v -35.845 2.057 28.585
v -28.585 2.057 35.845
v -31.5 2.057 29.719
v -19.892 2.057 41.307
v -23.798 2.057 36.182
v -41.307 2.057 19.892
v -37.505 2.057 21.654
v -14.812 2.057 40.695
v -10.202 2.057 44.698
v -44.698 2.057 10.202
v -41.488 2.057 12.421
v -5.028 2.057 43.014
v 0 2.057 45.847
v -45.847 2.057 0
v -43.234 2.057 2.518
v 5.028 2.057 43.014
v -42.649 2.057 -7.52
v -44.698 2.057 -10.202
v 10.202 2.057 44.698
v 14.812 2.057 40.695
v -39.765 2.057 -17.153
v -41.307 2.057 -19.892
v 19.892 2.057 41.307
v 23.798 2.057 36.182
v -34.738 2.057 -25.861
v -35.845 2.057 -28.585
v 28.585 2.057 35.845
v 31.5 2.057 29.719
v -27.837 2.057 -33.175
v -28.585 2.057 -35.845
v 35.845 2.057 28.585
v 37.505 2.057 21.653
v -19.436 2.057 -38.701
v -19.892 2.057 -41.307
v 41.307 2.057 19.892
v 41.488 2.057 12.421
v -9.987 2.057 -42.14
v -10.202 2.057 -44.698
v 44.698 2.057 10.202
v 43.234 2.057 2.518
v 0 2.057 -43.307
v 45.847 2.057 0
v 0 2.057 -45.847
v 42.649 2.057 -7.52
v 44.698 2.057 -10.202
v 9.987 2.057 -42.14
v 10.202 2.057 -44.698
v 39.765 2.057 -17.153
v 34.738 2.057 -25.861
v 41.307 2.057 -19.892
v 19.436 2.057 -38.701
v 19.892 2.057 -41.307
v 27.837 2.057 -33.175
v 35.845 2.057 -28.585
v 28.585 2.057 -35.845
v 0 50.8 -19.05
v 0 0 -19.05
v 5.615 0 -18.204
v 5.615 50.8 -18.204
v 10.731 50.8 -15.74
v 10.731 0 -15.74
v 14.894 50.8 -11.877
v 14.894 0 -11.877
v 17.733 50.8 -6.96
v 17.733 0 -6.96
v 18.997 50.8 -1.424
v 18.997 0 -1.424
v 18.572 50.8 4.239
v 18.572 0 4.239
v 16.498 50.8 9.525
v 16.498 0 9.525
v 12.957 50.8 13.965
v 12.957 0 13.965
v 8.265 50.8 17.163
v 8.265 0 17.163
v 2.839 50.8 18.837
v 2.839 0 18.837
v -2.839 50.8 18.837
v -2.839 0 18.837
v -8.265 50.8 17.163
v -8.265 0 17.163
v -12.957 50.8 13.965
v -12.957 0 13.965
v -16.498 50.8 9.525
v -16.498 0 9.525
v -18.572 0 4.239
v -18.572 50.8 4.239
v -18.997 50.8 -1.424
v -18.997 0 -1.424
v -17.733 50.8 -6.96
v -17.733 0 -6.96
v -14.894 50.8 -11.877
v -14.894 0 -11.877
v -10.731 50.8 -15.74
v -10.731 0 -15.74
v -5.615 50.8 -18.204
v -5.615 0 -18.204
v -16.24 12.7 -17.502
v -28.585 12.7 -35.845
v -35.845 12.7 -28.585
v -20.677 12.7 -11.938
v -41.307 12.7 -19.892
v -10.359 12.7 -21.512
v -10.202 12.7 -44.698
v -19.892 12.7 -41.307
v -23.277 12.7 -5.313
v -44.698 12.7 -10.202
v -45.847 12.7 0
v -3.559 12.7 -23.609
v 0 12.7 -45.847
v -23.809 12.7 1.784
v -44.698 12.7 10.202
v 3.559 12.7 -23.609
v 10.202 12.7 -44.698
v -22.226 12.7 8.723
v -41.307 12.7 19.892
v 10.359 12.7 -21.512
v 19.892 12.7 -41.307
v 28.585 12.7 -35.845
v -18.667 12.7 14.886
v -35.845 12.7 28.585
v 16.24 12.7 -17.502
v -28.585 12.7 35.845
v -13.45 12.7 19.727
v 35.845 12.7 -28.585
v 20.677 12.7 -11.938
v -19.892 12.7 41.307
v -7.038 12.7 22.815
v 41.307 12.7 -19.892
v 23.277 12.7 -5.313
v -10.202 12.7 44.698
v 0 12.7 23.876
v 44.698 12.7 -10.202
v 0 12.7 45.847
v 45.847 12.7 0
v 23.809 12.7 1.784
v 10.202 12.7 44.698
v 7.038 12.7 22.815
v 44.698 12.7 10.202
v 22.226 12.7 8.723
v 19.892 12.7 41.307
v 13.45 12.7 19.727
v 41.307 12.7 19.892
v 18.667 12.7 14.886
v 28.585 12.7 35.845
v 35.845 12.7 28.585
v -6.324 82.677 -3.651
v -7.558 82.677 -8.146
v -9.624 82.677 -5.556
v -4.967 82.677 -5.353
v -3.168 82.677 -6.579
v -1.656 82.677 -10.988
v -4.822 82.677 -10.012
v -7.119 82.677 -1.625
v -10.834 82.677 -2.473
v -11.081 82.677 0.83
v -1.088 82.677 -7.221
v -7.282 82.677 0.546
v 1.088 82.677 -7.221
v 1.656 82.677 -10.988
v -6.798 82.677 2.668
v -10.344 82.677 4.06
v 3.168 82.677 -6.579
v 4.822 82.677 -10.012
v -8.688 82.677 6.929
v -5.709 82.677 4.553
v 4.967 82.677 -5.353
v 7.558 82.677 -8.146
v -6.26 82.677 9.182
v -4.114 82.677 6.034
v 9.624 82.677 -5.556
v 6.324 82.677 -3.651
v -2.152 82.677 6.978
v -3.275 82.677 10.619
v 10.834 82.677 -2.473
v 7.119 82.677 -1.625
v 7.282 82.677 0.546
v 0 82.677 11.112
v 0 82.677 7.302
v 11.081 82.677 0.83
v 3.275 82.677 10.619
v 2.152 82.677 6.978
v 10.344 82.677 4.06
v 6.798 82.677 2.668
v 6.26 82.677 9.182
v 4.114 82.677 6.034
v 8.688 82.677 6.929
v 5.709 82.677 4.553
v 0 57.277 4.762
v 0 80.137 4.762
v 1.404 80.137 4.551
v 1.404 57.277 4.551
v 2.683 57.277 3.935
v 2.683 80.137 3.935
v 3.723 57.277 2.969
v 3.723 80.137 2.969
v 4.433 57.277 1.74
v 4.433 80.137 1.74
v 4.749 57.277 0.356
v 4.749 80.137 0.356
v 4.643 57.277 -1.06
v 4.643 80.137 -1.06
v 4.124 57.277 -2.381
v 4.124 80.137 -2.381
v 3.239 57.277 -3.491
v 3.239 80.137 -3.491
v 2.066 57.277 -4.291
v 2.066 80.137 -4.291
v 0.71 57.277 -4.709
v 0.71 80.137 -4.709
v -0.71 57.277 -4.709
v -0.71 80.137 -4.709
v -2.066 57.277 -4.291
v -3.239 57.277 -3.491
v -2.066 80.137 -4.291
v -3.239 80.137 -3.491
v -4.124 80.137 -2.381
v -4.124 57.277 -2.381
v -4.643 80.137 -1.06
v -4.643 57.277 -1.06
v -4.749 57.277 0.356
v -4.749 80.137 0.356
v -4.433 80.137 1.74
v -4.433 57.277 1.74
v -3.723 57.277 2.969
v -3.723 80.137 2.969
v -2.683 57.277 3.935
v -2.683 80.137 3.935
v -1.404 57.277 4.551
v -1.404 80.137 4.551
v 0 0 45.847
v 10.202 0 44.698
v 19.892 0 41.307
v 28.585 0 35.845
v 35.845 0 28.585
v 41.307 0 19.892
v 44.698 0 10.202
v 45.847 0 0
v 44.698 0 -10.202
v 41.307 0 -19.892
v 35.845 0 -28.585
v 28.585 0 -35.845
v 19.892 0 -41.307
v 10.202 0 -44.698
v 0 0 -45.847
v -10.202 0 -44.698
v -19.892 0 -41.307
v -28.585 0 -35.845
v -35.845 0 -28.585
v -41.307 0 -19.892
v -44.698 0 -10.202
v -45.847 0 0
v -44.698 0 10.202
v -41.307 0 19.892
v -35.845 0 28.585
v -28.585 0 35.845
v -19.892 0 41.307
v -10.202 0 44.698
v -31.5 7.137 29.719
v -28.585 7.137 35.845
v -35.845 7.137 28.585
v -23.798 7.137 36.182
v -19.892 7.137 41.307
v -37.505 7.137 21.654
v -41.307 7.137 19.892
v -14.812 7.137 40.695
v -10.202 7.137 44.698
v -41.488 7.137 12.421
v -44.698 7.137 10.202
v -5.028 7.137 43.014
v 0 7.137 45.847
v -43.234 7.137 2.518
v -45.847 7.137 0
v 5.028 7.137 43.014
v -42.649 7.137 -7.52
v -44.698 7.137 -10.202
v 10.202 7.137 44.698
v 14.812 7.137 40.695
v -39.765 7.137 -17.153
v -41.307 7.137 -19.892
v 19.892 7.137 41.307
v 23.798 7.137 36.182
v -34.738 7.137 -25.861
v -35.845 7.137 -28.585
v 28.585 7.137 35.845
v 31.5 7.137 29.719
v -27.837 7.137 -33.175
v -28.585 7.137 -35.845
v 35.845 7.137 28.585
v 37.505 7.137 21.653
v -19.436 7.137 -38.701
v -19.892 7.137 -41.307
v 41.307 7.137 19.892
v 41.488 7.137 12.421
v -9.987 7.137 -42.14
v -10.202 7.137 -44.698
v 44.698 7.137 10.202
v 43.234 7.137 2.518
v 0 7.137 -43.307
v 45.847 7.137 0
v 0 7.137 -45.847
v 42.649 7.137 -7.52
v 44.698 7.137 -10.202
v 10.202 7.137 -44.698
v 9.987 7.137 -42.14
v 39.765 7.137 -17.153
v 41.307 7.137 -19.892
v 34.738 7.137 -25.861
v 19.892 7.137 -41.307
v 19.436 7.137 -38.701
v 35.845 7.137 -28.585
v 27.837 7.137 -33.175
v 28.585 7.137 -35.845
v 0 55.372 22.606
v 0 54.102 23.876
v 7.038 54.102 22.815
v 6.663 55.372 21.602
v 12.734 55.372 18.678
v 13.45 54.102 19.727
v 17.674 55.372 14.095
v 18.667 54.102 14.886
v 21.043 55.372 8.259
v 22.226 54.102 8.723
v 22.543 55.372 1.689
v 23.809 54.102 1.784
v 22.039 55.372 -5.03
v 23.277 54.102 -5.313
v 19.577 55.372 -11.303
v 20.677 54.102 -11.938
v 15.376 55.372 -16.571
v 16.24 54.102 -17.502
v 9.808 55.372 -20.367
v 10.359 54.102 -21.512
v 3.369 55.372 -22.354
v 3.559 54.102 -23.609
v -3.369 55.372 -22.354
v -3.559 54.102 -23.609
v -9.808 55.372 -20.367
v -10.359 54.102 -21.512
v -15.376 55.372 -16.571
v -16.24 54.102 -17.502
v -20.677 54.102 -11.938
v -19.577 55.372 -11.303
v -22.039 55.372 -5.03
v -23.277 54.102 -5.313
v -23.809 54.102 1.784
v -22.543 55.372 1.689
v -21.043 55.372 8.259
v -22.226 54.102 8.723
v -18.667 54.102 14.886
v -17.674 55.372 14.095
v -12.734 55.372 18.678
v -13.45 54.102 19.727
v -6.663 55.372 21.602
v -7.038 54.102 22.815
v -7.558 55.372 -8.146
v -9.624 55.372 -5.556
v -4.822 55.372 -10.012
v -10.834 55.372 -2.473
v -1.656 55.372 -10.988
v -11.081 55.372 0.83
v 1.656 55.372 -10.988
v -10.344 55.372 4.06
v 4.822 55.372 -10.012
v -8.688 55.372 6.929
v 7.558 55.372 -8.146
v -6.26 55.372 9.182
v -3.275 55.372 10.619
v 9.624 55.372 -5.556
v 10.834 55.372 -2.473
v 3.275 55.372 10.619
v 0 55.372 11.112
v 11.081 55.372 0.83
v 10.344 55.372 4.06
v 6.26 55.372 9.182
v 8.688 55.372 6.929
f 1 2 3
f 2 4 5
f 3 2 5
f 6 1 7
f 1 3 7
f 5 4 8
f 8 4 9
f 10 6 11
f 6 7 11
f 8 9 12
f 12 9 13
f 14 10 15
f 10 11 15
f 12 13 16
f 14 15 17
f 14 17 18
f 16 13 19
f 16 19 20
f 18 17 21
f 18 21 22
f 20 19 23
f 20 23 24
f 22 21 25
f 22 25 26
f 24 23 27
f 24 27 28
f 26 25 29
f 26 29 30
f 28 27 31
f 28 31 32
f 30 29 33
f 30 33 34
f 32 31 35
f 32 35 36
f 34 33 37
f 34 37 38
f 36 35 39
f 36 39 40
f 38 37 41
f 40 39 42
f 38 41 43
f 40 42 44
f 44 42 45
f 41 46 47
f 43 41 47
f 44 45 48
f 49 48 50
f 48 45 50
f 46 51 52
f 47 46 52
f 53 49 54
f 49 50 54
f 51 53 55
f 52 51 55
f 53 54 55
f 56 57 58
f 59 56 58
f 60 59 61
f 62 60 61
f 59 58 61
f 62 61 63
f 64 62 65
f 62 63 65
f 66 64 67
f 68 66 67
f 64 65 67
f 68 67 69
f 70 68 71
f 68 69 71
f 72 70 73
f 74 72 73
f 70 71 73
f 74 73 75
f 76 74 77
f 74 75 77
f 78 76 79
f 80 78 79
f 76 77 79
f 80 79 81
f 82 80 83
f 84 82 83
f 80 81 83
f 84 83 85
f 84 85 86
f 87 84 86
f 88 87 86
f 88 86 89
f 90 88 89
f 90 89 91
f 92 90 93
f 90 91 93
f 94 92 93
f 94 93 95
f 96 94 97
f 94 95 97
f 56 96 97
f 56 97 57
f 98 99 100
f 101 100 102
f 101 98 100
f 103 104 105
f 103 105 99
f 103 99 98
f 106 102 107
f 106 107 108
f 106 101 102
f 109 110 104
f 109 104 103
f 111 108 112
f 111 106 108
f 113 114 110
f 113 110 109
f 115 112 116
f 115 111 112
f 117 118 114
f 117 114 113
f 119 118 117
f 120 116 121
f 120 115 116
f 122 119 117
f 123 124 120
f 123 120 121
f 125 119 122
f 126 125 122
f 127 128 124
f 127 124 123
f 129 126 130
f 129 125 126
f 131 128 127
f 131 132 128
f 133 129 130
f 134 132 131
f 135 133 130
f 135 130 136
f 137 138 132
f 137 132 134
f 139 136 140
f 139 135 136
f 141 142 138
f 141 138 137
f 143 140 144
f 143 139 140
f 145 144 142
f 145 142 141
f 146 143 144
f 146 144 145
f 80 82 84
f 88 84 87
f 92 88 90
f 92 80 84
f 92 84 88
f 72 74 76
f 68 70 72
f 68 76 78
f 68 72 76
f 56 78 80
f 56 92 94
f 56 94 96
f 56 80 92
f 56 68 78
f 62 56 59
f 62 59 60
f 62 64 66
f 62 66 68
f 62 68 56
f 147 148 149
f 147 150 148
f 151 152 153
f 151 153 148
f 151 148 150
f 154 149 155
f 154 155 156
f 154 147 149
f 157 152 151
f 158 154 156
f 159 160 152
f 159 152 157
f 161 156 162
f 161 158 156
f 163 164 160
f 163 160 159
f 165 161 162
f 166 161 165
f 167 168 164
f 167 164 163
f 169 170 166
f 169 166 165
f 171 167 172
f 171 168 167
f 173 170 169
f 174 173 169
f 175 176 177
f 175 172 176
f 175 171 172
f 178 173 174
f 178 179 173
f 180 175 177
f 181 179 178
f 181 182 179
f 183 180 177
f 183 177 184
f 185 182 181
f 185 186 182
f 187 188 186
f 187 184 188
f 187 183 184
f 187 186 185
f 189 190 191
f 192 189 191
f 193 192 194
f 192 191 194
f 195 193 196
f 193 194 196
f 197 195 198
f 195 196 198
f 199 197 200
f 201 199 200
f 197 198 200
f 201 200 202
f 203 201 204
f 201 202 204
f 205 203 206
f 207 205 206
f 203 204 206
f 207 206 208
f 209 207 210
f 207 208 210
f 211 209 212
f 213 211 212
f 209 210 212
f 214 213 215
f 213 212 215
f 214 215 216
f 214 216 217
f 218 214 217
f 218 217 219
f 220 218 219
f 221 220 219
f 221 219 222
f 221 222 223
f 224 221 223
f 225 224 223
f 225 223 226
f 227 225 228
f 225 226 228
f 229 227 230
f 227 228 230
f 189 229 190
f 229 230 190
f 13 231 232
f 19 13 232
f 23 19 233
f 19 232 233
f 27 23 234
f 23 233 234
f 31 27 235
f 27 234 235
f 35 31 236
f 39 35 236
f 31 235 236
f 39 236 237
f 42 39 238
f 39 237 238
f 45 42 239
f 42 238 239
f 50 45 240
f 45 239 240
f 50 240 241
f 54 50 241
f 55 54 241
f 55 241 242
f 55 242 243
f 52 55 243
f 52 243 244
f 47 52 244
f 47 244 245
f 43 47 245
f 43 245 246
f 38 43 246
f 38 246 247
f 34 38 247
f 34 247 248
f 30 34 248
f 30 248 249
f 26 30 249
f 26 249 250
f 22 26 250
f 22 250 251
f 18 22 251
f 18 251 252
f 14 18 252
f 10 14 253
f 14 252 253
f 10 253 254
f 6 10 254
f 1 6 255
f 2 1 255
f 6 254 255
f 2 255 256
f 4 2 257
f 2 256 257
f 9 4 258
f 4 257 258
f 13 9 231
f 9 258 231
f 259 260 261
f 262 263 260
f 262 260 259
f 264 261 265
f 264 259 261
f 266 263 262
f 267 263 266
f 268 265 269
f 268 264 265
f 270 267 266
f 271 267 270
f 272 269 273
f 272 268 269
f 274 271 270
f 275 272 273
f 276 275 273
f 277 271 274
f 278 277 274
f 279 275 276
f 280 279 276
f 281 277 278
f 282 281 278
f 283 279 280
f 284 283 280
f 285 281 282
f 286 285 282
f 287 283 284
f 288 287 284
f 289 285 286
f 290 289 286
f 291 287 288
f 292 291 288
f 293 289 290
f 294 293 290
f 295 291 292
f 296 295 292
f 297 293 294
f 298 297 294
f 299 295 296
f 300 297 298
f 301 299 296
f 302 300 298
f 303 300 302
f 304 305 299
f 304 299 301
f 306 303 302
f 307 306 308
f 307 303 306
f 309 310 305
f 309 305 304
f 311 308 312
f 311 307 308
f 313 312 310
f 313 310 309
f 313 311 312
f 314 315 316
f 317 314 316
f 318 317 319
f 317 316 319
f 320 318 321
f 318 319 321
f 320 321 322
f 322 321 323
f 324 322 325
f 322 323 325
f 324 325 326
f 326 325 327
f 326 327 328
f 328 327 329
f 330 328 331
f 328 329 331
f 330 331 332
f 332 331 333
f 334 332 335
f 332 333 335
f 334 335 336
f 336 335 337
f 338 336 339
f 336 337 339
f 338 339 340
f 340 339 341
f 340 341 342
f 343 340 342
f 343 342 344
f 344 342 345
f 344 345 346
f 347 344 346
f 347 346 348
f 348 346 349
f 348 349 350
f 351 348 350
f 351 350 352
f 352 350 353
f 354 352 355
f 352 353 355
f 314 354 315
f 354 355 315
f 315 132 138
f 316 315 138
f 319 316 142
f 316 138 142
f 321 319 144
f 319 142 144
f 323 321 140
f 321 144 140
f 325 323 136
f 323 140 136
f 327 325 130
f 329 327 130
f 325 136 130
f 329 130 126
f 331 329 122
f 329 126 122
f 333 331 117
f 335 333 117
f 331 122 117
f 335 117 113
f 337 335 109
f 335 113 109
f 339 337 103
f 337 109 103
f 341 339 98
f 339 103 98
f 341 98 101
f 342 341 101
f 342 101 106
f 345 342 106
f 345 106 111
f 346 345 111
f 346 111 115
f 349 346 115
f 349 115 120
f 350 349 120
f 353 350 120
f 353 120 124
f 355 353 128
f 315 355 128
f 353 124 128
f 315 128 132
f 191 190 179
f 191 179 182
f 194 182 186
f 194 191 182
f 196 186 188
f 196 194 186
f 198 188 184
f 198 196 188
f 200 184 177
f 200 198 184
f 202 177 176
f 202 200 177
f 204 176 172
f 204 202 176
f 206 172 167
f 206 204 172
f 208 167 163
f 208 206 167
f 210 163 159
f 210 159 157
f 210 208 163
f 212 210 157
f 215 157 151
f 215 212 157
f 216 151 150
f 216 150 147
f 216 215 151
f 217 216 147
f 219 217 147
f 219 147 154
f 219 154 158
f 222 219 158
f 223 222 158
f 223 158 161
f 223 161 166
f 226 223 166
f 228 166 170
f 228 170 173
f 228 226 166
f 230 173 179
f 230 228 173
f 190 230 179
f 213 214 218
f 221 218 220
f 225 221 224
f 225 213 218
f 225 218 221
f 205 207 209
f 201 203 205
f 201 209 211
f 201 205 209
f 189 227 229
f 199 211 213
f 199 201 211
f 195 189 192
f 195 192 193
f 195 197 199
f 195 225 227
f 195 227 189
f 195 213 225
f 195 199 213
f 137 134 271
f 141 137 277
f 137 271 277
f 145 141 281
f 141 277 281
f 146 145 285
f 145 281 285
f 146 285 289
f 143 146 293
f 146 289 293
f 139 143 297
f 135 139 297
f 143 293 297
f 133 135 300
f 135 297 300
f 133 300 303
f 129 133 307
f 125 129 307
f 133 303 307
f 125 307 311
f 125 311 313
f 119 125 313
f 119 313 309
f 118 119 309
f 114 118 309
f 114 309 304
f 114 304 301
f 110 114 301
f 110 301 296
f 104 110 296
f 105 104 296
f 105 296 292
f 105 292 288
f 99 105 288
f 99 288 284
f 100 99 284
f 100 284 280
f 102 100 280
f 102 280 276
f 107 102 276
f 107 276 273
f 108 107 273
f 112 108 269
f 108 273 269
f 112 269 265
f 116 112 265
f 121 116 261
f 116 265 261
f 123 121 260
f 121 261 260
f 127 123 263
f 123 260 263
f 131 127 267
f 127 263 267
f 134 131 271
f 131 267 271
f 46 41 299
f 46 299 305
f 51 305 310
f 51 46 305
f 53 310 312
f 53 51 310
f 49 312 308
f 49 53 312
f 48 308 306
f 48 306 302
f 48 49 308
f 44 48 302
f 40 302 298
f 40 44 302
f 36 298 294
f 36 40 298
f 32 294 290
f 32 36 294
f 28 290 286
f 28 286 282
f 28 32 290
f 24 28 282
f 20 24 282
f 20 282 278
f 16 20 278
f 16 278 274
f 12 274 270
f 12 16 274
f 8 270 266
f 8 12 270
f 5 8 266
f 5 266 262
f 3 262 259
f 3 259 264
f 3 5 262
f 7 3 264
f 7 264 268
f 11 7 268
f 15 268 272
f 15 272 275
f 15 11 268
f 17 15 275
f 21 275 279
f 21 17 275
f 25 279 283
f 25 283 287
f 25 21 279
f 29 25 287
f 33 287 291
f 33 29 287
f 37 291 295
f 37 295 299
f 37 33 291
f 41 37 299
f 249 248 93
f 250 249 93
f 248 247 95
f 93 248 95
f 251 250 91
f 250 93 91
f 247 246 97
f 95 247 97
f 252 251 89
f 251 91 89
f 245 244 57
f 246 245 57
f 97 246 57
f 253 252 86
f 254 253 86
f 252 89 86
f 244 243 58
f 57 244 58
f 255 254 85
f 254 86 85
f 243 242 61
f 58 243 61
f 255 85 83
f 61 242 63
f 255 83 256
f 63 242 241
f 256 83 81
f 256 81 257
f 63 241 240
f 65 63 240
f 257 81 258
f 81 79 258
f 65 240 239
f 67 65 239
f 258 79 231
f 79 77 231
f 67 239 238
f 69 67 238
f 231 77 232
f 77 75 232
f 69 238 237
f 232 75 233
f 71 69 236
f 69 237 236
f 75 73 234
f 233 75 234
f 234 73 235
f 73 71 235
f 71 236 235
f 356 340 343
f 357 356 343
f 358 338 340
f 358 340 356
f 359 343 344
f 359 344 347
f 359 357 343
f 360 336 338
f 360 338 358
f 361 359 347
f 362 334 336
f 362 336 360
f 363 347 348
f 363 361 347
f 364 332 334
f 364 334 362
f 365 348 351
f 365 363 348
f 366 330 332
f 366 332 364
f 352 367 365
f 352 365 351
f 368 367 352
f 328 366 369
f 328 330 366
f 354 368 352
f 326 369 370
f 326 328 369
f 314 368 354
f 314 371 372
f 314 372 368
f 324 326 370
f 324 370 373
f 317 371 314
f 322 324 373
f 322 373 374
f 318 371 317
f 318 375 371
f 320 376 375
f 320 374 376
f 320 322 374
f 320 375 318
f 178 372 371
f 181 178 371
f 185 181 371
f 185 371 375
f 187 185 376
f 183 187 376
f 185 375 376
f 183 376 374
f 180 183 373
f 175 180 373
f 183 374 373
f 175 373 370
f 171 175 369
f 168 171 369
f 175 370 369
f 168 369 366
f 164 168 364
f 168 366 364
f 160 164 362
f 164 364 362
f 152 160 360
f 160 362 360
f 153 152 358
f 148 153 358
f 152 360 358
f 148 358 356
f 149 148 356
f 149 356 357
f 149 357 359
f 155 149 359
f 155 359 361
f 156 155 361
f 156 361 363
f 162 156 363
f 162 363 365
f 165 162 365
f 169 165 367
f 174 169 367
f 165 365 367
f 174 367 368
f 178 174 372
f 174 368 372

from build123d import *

# Parameters (mm, degrees)
SKETCH1_R           = 45.847
BOSS_EXTRUDE1_DEPTH = 12.7
SKETCH2_R           = 23.876
BOSS_EXTRUDE2_DEPTH = 42.672
SKETCH3_R           = 11.1125
BOSS_EXTRUDE3_DEPTH = 27.305
SKETCH5_R           = 4.7625
CUT_EXTRUDE1_DEPTH  = 25.4
CHAMFER1_SIZE       = 2.54
CHAMFER2_SIZE       = 1.27
SKETCH6_R           = 19.05
CUT_EXTRUDE2_DEPTH  = 50.8
CUT_EXTRUDE3_START  = -2.0574
SKETCH7_R           = 45.847
SKETCH7_R_2         = 43.307
CUT_EXTRUDE3_DEPTH  = 5.08


with BuildPart() as part:
    # Sketch1 → Boss-Extrude1 (new body)
    with BuildSketch(Plane(origin=(0, 0, 0), x_dir=(1, 0, 0), z_dir=(0, 1, 0))):
        with Locations(Location((0, 0, 0), (0, 0, 270))):
            Circle(SKETCH1_R)
    extrude(amount=BOSS_EXTRUDE1_DEPTH)

    # Sketch2 → Boss-Extrude2 (add)
    with BuildSketch(Plane(origin=(0, 12.7, 0), x_dir=(1, 0, 0), z_dir=(0, 1, 0))):
        with Locations(Location((0, 0, 0), (0, 0, 270))):
            Circle(SKETCH2_R)
    extrude(amount=BOSS_EXTRUDE2_DEPTH)

    # Sketch3 → Boss-Extrude3 (add)
    with BuildSketch(Plane(origin=(0, 55.372, 0), x_dir=(1, 0, 0), z_dir=(0, 1, 0))):
        with Locations(Location((0, 0, 0), (0, 0, 270))):
            Circle(SKETCH3_R)
    extrude(amount=BOSS_EXTRUDE3_DEPTH)

    # Sketch5 → Cut-Extrude1 (cut)
    with BuildSketch(Plane(origin=(0, 82.677, 0), x_dir=(1, 0, 0), z_dir=(0, 1, 0))):
        with Locations(Location((0, 0, 0), (0, 0, 270))):
            Circle(SKETCH5_R)
    extrude(amount=-CUT_EXTRUDE1_DEPTH, mode=Mode.SUBTRACT)

    # Chamfer1
    chamfer1_edges = [part.edges().sort_by_distance(p)[0] for p in [
        (0, 82.677, -4.7625),
    ]]
    chamfer(chamfer1_edges, length=CHAMFER1_SIZE)

    # Chamfer2
    chamfer2_edges = [part.edges().sort_by_distance(p)[0] for p in [
        (0, 55.372, -23.876),
    ]]
    chamfer(chamfer2_edges, length=CHAMFER2_SIZE)

    # Sketch6 → Cut-Extrude2 (cut)
    with BuildSketch(Plane.XZ):
        with Locations(Location((0, 0, 0), (0, 0, 270))):
            Circle(SKETCH6_R)
    extrude(amount=-CUT_EXTRUDE2_DEPTH, mode=Mode.SUBTRACT)

    # Sketch7 → Cut-Extrude3 (cut)
    with BuildSketch(Plane.XZ.offset(CUT_EXTRUDE3_START)):
        with Locations(Location((0, 0, 0), (0, 0, 270))):
            Circle(SKETCH7_R)
        with Locations(Location((0, 0, 0), (0, 0, 270))):
            Circle(SKETCH7_R_2, mode=Mode.SUBTRACT)
    extrude(amount=-CUT_EXTRUDE3_DEPTH, mode=Mode.SUBTRACT)


solid = part.part
